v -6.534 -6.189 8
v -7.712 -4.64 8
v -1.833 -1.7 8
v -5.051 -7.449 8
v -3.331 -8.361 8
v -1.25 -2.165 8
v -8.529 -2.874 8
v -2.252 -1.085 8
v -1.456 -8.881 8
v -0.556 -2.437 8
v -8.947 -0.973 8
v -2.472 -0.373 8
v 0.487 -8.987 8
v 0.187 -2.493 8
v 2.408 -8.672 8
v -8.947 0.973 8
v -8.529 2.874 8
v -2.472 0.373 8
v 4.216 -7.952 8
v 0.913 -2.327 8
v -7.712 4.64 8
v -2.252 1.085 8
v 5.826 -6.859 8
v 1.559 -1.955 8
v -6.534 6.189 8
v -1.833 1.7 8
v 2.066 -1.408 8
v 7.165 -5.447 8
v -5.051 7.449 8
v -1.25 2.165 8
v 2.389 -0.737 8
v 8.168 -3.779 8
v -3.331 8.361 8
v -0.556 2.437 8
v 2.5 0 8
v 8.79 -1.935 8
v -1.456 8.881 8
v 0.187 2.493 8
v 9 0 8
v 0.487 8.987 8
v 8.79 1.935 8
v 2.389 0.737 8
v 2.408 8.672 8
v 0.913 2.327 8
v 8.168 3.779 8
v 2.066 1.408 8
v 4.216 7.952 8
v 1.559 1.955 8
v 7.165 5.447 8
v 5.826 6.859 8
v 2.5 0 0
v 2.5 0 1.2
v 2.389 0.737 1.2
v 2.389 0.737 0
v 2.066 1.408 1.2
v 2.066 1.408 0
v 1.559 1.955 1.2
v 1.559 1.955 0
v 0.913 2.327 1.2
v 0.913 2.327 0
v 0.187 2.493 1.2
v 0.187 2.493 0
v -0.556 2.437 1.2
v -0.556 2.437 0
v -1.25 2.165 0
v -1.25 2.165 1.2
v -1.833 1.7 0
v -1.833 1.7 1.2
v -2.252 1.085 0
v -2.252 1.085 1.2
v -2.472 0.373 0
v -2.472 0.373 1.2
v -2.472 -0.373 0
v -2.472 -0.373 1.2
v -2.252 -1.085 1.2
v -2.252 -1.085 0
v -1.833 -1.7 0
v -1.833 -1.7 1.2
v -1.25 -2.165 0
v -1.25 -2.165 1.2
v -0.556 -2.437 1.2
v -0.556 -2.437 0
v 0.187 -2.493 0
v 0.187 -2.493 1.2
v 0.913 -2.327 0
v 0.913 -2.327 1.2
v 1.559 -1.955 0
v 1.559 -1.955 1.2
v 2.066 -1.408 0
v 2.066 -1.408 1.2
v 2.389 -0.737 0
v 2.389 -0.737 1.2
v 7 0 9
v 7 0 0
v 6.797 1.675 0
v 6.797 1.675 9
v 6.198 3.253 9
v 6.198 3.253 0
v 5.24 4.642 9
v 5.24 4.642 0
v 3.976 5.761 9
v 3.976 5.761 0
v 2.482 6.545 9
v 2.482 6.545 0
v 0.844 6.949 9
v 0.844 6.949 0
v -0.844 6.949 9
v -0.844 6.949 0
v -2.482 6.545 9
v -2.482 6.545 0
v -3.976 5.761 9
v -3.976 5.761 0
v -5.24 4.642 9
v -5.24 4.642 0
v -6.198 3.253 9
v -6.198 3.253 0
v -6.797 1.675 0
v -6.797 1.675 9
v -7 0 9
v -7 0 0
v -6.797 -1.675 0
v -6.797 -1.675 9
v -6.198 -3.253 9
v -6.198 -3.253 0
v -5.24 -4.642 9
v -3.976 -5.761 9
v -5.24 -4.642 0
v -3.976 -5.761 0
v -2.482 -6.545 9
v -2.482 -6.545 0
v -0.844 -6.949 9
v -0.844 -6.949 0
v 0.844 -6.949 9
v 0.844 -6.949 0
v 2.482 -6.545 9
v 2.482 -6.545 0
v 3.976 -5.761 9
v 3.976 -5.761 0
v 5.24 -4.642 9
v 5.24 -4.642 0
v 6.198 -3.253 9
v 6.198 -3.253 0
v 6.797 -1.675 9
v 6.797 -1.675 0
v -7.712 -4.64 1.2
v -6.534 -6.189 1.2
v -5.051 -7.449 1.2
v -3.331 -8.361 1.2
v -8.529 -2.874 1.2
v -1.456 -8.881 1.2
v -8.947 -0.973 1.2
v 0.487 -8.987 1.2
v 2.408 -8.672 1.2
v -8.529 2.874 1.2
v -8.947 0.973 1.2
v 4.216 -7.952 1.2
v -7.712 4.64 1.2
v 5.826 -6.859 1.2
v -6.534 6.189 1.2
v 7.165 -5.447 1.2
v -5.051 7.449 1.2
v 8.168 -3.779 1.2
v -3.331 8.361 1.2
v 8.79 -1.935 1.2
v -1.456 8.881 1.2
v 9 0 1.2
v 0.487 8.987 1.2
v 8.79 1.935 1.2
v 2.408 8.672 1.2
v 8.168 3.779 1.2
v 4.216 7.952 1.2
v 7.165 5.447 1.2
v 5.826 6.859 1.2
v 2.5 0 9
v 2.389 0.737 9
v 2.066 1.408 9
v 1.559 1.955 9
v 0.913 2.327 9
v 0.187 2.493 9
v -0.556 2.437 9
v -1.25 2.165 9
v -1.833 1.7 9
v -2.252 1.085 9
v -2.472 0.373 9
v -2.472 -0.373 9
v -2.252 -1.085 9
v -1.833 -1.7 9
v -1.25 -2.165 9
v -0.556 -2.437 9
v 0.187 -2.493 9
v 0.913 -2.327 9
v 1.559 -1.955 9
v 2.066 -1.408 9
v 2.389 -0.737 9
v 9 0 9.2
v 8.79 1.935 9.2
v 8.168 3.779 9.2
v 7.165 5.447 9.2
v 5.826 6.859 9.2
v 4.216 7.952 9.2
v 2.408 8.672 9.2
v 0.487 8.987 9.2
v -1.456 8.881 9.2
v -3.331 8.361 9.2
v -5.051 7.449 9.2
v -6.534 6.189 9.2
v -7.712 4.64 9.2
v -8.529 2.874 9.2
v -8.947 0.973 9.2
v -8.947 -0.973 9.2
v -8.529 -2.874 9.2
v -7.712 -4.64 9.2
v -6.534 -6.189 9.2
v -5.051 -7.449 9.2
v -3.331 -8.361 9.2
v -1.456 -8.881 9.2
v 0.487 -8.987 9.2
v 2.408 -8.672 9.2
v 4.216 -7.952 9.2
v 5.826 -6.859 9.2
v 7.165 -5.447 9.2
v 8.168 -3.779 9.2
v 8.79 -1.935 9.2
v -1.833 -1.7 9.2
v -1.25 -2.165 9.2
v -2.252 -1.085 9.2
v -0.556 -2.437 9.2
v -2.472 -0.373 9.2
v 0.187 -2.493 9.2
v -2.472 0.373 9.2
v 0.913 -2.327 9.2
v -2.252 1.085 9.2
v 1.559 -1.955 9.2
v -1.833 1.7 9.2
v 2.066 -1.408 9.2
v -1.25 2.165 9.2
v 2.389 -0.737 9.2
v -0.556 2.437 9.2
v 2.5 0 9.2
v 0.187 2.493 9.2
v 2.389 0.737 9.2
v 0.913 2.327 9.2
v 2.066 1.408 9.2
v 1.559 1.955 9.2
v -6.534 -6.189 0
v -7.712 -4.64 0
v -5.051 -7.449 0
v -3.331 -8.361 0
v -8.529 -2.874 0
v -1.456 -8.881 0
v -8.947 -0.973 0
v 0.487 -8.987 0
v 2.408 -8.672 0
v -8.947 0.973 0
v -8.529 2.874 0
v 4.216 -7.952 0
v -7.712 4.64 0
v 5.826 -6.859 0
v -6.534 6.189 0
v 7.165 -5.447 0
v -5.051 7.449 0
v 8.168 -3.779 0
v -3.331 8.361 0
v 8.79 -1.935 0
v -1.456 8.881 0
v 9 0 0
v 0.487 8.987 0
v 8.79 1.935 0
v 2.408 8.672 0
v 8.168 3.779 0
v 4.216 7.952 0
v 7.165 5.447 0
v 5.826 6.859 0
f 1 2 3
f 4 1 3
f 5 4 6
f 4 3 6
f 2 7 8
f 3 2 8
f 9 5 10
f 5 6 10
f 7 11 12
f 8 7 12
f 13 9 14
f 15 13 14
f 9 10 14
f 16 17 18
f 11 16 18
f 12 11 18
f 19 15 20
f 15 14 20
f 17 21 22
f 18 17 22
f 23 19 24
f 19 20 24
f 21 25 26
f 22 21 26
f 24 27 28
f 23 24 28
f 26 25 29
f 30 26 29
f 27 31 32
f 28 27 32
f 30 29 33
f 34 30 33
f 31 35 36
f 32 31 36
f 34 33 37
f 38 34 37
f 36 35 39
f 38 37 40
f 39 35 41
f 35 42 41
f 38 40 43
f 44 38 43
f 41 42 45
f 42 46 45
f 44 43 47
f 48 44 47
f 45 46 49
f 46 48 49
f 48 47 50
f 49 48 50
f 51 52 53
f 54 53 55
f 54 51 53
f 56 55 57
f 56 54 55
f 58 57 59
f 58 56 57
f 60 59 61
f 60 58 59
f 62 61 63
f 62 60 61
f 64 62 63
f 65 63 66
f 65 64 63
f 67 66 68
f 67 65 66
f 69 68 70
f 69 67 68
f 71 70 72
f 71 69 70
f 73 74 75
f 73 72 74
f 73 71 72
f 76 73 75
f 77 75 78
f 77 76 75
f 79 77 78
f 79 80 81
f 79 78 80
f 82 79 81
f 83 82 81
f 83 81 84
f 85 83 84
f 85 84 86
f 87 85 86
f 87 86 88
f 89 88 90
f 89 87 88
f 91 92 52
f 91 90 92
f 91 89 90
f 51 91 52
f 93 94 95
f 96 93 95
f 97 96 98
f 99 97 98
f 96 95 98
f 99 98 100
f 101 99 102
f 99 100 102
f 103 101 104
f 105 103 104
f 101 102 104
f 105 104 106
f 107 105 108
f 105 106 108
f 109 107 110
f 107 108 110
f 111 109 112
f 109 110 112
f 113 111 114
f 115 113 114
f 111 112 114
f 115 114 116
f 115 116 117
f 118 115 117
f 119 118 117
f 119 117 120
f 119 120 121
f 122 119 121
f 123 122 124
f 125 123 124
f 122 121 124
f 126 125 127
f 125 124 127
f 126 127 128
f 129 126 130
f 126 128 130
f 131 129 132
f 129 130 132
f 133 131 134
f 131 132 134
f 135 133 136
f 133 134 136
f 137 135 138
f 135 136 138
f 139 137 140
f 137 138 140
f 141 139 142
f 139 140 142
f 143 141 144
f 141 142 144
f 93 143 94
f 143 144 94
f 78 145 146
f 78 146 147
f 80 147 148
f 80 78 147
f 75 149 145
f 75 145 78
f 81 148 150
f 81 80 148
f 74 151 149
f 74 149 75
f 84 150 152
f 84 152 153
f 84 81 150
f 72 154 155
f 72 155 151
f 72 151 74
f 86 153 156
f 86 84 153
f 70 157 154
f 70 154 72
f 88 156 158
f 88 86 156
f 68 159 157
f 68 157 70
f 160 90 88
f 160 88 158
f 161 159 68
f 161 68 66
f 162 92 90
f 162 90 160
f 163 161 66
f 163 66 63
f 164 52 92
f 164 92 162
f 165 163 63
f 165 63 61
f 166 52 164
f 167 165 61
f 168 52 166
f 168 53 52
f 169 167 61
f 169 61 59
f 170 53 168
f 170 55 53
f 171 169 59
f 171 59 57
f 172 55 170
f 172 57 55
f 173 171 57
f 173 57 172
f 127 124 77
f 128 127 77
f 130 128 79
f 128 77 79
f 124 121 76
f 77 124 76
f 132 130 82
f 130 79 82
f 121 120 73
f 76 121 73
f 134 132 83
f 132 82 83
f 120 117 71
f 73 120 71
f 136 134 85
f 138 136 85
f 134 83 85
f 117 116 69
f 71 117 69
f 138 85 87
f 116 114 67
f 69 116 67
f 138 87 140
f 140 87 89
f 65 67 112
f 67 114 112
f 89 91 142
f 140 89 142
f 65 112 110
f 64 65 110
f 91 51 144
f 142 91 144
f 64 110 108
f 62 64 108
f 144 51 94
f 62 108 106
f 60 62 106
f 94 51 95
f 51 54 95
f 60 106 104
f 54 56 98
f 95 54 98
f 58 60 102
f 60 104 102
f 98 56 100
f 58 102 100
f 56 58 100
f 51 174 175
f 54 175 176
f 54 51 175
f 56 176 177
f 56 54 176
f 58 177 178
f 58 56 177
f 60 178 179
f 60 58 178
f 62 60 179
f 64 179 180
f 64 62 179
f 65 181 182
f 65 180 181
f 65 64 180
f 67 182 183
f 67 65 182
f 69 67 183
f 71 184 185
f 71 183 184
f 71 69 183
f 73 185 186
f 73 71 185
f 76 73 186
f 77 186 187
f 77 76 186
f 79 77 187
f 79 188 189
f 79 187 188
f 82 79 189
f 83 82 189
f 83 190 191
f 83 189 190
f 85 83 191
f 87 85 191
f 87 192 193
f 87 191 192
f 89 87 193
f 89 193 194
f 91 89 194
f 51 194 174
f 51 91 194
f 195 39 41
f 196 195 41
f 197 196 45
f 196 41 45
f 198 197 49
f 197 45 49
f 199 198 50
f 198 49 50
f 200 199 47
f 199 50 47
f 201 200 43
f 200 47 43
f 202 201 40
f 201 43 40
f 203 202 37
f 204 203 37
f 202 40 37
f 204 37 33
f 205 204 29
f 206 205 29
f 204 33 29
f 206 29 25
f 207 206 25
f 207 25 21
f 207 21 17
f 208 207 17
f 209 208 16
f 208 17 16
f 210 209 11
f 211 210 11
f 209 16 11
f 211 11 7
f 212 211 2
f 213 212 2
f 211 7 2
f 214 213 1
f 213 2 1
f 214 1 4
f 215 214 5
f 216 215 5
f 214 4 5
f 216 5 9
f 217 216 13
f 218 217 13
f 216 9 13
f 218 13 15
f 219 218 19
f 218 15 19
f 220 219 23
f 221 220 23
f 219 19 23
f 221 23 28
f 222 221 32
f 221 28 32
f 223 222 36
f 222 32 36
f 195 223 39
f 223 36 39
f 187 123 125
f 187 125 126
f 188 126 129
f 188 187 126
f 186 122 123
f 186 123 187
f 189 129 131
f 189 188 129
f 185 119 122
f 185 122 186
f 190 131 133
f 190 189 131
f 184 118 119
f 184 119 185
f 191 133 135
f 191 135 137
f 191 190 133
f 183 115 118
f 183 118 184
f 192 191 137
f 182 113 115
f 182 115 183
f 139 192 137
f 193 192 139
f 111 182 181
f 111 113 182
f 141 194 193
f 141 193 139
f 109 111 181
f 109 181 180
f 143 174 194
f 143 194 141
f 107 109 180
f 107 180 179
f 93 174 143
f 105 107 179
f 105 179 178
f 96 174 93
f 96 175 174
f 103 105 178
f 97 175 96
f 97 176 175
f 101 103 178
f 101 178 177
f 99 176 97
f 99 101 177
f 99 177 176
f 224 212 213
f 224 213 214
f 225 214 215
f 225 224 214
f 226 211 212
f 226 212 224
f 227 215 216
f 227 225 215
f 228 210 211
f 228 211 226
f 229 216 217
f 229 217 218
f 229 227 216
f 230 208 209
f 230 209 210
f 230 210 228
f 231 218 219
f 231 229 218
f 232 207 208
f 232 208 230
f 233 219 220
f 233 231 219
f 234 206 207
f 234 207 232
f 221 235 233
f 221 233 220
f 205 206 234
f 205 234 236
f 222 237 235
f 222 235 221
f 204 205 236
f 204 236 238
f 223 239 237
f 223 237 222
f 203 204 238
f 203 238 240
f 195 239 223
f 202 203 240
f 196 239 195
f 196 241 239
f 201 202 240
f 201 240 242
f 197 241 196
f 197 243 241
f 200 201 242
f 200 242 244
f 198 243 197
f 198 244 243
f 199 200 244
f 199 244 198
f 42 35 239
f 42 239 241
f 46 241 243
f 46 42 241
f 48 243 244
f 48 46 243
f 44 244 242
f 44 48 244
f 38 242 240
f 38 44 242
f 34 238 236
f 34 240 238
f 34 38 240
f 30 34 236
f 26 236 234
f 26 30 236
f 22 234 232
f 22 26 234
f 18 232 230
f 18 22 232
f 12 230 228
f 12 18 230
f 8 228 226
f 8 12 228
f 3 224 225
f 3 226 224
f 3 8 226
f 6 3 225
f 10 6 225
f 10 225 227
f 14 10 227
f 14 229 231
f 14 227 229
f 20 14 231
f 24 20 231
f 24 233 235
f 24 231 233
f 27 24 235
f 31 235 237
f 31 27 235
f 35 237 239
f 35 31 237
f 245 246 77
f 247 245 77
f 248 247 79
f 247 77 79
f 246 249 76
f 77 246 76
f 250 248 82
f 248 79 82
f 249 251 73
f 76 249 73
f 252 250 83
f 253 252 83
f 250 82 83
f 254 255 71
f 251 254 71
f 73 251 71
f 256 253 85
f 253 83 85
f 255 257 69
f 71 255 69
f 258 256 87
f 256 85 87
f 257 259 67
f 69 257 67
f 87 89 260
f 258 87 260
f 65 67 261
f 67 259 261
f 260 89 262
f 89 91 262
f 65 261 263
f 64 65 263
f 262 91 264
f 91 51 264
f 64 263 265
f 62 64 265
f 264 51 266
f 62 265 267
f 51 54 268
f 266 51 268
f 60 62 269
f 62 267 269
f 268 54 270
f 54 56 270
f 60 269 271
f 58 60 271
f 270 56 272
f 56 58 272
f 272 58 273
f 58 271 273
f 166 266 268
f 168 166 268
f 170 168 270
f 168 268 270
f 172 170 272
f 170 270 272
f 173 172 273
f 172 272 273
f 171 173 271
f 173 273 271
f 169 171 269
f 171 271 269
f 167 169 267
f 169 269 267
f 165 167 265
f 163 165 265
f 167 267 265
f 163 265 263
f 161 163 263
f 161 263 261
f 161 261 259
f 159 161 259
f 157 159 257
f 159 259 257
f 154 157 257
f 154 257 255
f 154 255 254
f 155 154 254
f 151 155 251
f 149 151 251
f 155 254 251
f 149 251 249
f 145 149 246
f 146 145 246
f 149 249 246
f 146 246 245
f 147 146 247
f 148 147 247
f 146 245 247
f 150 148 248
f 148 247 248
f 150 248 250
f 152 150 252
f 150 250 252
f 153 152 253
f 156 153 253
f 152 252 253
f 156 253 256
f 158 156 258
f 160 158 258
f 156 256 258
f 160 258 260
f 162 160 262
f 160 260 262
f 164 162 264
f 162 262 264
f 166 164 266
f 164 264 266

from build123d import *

# Parameters (mm, degrees)
CYLINDER003_R     = 2.5
CYLINDER003_DEPTH = 12
CYLINDER002_R     = 7
CYLINDER002_DEPTH = 9
CYLINDER001_R     = 9
CYLINDER001_DEPTH = 1.2
CYLINDER_R        = 9
CYLINDER_DEPTH    = 1.2


with BuildPart() as knock:
    # Cylinder003 → Cylinder003 (new body)
    with BuildSketch(Plane.XY):
        Circle(CYLINDER003_R)
    extrude(amount=CYLINDER003_DEPTH)


with BuildPart() as cut:
    # Cylinder002 → Cylinder002 (new body)
    with BuildSketch(Plane.XY):
        Circle(CYLINDER002_R)
    extrude(amount=CYLINDER002_DEPTH)

    # Cut: cut KNOCK
    add(knock.part, mode=Mode.SUBTRACT)


with BuildPart() as cut001:
    # Cylinder001 → Cylinder001 (new body)
    with BuildSketch(Plane.XY.offset(8)):
        Circle(CYLINDER001_R)
    extrude(amount=CYLINDER001_DEPTH)

    # Cut001: cut KNOCK
    add(knock.part, mode=Mode.SUBTRACT)


with BuildPart() as cut002:
    # Cylinder → Cylinder (new body)
    with BuildSketch(Plane.XY):
        Circle(CYLINDER_R)
    extrude(amount=CYLINDER_DEPTH)

    # Cut002: cut KNOCK
    add(knock.part, mode=Mode.SUBTRACT)


solid = Compound([cut.part, cut001.part, cut002.part])
